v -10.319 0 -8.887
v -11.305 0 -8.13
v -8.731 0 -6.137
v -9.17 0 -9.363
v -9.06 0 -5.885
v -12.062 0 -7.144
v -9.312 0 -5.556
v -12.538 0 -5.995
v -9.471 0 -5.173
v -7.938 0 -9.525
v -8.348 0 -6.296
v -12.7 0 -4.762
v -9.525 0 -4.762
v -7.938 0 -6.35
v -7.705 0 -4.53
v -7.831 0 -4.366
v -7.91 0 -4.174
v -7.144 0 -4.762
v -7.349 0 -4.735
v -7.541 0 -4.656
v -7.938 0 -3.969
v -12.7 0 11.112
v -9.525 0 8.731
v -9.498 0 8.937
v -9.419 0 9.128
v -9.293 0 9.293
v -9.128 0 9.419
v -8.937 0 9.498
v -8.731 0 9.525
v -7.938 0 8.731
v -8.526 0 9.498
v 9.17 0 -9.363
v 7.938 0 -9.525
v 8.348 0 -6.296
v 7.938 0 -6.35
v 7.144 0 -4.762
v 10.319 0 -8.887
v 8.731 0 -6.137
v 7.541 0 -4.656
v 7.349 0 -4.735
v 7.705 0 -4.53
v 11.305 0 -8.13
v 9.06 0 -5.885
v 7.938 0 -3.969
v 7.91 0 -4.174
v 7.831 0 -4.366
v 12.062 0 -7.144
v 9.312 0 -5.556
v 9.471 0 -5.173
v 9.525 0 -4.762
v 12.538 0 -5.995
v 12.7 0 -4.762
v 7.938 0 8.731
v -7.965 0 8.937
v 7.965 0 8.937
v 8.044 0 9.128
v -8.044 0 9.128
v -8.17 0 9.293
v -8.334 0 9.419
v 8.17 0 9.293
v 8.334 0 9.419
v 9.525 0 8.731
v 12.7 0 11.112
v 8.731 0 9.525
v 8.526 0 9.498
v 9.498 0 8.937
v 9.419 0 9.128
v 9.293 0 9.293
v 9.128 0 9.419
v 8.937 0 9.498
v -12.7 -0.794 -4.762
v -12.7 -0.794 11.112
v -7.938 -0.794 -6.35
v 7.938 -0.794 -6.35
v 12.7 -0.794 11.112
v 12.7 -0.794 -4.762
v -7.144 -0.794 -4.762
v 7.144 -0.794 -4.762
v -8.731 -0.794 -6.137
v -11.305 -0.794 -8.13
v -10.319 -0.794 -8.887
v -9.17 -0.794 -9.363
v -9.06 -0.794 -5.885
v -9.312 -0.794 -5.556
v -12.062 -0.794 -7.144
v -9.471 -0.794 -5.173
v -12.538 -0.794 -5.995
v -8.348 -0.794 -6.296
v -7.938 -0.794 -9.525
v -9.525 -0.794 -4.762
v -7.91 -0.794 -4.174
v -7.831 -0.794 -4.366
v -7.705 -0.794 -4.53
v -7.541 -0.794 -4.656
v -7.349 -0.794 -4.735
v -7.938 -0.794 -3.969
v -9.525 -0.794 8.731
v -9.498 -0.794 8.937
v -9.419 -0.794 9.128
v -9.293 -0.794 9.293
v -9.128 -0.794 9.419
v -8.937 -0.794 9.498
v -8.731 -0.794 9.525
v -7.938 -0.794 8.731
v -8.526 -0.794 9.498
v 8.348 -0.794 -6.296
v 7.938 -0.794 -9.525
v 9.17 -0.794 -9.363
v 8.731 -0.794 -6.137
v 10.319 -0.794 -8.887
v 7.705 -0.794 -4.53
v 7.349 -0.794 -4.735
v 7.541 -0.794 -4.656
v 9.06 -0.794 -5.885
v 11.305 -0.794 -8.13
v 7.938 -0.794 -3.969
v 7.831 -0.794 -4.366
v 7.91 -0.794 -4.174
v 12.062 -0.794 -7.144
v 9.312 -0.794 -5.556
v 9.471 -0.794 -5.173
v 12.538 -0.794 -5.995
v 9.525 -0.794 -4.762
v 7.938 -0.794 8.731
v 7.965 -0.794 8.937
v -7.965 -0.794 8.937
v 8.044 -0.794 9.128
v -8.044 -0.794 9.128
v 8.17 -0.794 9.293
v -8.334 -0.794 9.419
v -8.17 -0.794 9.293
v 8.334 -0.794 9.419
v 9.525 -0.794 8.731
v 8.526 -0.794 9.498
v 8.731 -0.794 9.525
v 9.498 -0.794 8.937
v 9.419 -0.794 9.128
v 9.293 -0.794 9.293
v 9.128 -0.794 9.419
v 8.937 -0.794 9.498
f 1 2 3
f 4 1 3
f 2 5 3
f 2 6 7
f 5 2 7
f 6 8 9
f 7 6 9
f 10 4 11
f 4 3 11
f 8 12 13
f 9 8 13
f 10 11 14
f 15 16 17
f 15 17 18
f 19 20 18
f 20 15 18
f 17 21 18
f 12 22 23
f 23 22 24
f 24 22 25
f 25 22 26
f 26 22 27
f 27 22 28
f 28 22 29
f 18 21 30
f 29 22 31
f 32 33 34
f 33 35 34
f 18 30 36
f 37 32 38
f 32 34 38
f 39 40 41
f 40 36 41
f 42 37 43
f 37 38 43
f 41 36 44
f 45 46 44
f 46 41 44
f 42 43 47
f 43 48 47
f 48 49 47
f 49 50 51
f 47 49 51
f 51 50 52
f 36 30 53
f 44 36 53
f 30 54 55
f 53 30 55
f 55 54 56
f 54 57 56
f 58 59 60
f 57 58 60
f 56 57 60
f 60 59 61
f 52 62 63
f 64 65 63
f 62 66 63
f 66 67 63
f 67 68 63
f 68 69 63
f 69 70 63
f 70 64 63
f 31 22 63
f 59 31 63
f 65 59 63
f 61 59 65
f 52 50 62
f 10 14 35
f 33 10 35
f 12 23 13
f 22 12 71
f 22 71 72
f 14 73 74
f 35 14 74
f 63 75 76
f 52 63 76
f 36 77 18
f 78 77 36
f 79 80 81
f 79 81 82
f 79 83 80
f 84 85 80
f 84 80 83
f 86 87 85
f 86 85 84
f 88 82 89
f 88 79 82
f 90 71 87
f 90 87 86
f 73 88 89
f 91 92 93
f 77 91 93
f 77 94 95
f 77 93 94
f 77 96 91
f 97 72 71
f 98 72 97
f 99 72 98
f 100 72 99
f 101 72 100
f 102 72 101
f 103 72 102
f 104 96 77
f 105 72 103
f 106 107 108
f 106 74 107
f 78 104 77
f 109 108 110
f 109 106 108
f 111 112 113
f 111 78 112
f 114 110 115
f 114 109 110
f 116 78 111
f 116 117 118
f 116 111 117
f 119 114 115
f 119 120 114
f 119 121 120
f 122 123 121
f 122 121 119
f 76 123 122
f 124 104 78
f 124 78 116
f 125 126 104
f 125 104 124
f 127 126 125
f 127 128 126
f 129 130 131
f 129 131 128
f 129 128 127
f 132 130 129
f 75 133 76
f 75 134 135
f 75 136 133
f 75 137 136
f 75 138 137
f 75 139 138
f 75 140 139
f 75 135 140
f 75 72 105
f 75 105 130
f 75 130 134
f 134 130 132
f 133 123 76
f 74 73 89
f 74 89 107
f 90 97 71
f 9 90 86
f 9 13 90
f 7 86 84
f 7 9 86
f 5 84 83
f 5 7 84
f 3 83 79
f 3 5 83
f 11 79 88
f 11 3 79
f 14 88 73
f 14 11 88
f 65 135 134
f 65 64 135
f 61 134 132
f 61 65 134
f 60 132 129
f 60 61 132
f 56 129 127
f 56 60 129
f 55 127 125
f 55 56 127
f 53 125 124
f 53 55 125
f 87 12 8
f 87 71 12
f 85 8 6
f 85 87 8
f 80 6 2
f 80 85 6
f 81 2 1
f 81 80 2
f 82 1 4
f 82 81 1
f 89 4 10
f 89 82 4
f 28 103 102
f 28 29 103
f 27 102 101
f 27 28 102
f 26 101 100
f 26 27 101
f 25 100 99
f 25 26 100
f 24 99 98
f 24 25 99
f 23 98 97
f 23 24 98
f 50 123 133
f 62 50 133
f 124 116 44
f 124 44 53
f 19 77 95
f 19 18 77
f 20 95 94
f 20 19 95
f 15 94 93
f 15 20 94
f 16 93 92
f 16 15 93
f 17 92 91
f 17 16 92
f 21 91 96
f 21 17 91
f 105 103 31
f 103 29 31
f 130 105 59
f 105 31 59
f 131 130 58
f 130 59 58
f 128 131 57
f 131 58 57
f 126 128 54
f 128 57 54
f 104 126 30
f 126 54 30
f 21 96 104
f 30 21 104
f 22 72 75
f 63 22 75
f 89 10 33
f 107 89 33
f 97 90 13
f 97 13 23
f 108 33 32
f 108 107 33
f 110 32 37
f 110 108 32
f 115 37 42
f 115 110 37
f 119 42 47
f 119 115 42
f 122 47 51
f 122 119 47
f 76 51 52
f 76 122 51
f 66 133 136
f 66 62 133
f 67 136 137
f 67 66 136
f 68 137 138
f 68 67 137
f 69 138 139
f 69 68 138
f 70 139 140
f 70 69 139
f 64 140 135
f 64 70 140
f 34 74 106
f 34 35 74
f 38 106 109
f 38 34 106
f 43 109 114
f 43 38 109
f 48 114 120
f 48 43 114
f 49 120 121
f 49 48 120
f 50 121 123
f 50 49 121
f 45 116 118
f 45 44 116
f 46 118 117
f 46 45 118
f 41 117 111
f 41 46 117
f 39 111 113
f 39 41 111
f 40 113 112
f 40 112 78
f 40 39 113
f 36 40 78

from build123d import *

# Parameters (mm, degrees)
F0_W      = 25.4
F0_H      = 19.05
F1_DEPTH  = 0.79375
F2_R      = 4.7625
F3_W      = 19.05
F3_H      = 15.875
F4_DEPTH  = 4.9276
F6_DEPTH  = 0.79375
F7_R      = 1.5875
F9_W      = 15.875
F9_H      = 14.2875
F10_DEPTH = 0.79375
F11_R     = 0.79374
F12_R     = 0.79375
F14_DEPTH = 25.4
F15_W     = 25.4
F15_H     = 4.7625
F16_DEPTH = 25.4


# Not quite as in the source:
# - two fillets or chamfers of one size are made in one step
# - a fillet or chamfer is up to 0.001 mm smaller than in the source, because OpenCascade refuses the exact size


with BuildPart() as f1:
    # F0 (on Front) → F1 (new body)
    with BuildSketch(Plane.XZ):
        Rectangle(F0_W, F0_H)
    extrude(amount=F1_DEPTH)

    # F2
    f2_edges = [f1.edges().sort_by_distance(p)[0] for p in [
        (12.7, -0.396875, -9.525),
        (-12.7, -0.396875, -9.525),
    ]]
    fillet(f2_edges, radius=F2_R)

    # F3 (on face) → F4 (cut)
    with BuildSketch(Plane.XZ.offset(0.79375)):
        with Locations((0, 1.5875)):
            Rectangle(F3_W, F3_H)
    extrude(amount=-F4_DEPTH, mode=Mode.SUBTRACT)

    # F5 (on face) → F6 (join)
    with BuildSketch(Plane.XZ.offset(0.79375)):
        Polygon((-15.875, 15.875), (-15.875, 9.525), (-12.7, 9.525), (-9.525, 9.525), (9.525, 9.525), (12.7, 9.525), (15.875, 9.525), (15.875, 15.875), align=None)
    extrude(amount=-F6_DEPTH)

    # F7
    f7_edges = [f1.edges().sort_by_distance(p)[0] for p in [
        (-15.875, -0.396875, 15.875),
        (15.875, -0.396875, 15.875),
        (15.875, -0.396875, 9.525),
        (-15.875, -0.396875, 9.525),
        (-9.525, -0.396875, -6.35),
        (9.525, -0.396875, -6.35),
    ]]
    fillet(f7_edges, radius=F7_R)

    # F9 (on face) → F10 (join)
    with BuildSketch(Plane.XZ.offset(0.79375)):
        with BuildLine():
            ThreePointArc((-14.2875, 15.875), (-15.4100320151, 15.4100320151), (-15.875, 14.2875))
            Line((-15.875, 14.2875), (-15.875, 11.1125))
            ThreePointArc((-15.875, 11.1125), (-15.4100320151, 9.9899679849), (-14.2875, 9.525))
            Line((-14.2875, 9.525), (-12.7, 9.525))
            Line((-12.7, 9.525), (-12.7, -4.7625))
            ThreePointArc((-12.7, -4.7625), (-11.3050960454, -8.1300960454), (-7.9375, -9.525))
            Line((-7.9375, -9.525), (7.9375, -9.525))
            ThreePointArc((7.9375, -9.525), (11.3050960454, -8.1300960454), (12.7, -4.7625))
            Line((12.7, -4.7625), (12.7, 9.525))
            Line((12.7, 9.525), (14.2875, 9.525))
            ThreePointArc((14.2875, 9.525), (15.4100320151, 9.9899679849), (15.875, 11.1125))
            Line((15.875, 11.1125), (15.875, 14.2875))
            ThreePointArc((15.875, 14.2875), (15.4100320151, 15.4100320151), (14.2875, 15.875))
            Line((14.2875, 15.875), (-14.2875, 15.875))
        make_face()
        with BuildLine():
            Line((-9.525, 9.525), (-7.9375, 9.525))
            Line((-7.9375, 9.525), (7.9375, 9.525))
            Line((7.9375, 9.525), (9.525, 9.525))
            Line((9.525, 9.525), (9.525, -4.7625))
            ThreePointArc((9.525, -4.7625), (9.0600320151, -5.8850320151), (7.9375, -6.35))
            Line((7.9375, -6.35), (-7.9375, -6.35))
            ThreePointArc((-7.9375, -6.35), (-9.0600320151, -5.8850320151), (-9.525, -4.7625))
            Line((-9.525, -4.7625), (-9.525, 9.525))
        make_face(mode=Mode.SUBTRACT)
        with Locations((0, 2.38125)):
            Rectangle(F9_W, F9_H)
    extrude(amount=-F10_DEPTH)

    # F11 (radius 0.79375 in the source; OpenCascade refuses exactly that, so slightly less here)
    f11_edges = [f1.edges().sort_by_distance(p)[0] for p in [
        (-7.9375, -0.396875, 9.525),
        (-9.525, -0.396875, 9.525),
        (7.9375, -0.396875, 9.525),
        (9.525, -0.396875, 9.525),
    ]]
    fillet(f11_edges, radius=F11_R)

    # F12
    f12_edges = [f1.edges().sort_by_distance(p)[0] for p in [
        (-7.9375, -0.396875, -4.7625),
        (7.9375, -0.396875, -4.7625),
    ]]
    fillet(f12_edges, radius=F12_R)

    # F13 (on face) → F14 (cut)
    with BuildSketch(Plane.XZ.offset(0.79375)):
        with BuildLine():
            Line((-17.2636155039, 7.9375), (-12.7, 7.9375))
            Line((-12.7, 7.9375), (-12.7, 9.525))
            Line((-12.7, 9.525), (-14.2875, 9.525))
            ThreePointArc((-14.2875, 9.525), (-15.4100320151, 9.9899679849), (-15.875, 11.1125))
            Line((-15.875, 11.1125), (-15.875, 14.2875))
            ThreePointArc((-15.875, 14.2875), (-15.4100320151, 15.4100320151), (-14.2875, 15.875))
            Line((-14.2875, 15.875), (-12.7, 15.875))
            Line((-12.7, 15.875), (-12.7, 16.6596230119))
            Line((-12.7, 16.6596230119), (-17.2636155039, 16.6596230119))
            Line((-17.2636155039, 16.6596230119), (-17.2636155039, 7.9375))
        make_face()
        with BuildLine():
            Line((-14.2875, 9.525), (-12.7, 9.525))
            Line((-12.7, 9.525), (-12.7, 15.875))
            Line((-12.7, 15.875), (-14.2875, 15.875))
            ThreePointArc((-14.2875, 15.875), (-15.4100320151, 15.4100320151), (-15.875, 14.2875))
            Line((-15.875, 14.2875), (-15.875, 11.1125))
            ThreePointArc((-15.875, 11.1125), (-15.4100320151, 9.9899679849), (-14.2875, 9.525))
        make_face()
        with BuildLine():
            Line((14.2875, 15.875), (12.7, 15.875))
            Line((12.7, 15.875), (12.7, 9.525))
            Line((12.7, 9.525), (14.2875, 9.525))
            ThreePointArc((14.2875, 9.525), (15.4100320151, 9.9899679849), (15.875, 11.1125))
            Line((15.875, 11.1125), (15.875, 14.2875))
            ThreePointArc((15.875, 14.2875), (15.4100320151, 15.4100320151), (14.2875, 15.875))
        make_face()
        with BuildLine():
            Line((12.7, 16.9361550361), (12.7, 15.875))
            Line((12.7, 15.875), (14.2875, 15.875))
            ThreePointArc((14.2875, 15.875), (15.4100320151, 15.4100320151), (15.875, 14.2875))
            Line((15.875, 14.2875), (15.875, 11.1125))
            ThreePointArc((15.875, 11.1125), (15.4100320151, 9.9899679849), (14.2875, 9.525))
            Line((14.2875, 9.525), (12.7, 9.525))
            Line((12.7, 9.525), (12.7, 7.9375))
            Line((12.7, 7.9375), (16.7191289365, 7.9375))
            Line((16.7191289365, 7.9375), (16.7191289365, 16.9361550361))
            Line((16.7191289365, 16.9361550361), (12.7, 16.9361550361))
        make_face()
    extrude(amount=-F14_DEPTH, mode=Mode.SUBTRACT)

    # F15 (on face) → F16 (cut)
    with BuildSketch(Plane.XZ.offset(0.79375)):
        with Locations((0, 13.49375)):
            Rectangle(F15_W, F15_H)
    extrude(amount=-F16_DEPTH, mode=Mode.SUBTRACT)


solid = f1.part
